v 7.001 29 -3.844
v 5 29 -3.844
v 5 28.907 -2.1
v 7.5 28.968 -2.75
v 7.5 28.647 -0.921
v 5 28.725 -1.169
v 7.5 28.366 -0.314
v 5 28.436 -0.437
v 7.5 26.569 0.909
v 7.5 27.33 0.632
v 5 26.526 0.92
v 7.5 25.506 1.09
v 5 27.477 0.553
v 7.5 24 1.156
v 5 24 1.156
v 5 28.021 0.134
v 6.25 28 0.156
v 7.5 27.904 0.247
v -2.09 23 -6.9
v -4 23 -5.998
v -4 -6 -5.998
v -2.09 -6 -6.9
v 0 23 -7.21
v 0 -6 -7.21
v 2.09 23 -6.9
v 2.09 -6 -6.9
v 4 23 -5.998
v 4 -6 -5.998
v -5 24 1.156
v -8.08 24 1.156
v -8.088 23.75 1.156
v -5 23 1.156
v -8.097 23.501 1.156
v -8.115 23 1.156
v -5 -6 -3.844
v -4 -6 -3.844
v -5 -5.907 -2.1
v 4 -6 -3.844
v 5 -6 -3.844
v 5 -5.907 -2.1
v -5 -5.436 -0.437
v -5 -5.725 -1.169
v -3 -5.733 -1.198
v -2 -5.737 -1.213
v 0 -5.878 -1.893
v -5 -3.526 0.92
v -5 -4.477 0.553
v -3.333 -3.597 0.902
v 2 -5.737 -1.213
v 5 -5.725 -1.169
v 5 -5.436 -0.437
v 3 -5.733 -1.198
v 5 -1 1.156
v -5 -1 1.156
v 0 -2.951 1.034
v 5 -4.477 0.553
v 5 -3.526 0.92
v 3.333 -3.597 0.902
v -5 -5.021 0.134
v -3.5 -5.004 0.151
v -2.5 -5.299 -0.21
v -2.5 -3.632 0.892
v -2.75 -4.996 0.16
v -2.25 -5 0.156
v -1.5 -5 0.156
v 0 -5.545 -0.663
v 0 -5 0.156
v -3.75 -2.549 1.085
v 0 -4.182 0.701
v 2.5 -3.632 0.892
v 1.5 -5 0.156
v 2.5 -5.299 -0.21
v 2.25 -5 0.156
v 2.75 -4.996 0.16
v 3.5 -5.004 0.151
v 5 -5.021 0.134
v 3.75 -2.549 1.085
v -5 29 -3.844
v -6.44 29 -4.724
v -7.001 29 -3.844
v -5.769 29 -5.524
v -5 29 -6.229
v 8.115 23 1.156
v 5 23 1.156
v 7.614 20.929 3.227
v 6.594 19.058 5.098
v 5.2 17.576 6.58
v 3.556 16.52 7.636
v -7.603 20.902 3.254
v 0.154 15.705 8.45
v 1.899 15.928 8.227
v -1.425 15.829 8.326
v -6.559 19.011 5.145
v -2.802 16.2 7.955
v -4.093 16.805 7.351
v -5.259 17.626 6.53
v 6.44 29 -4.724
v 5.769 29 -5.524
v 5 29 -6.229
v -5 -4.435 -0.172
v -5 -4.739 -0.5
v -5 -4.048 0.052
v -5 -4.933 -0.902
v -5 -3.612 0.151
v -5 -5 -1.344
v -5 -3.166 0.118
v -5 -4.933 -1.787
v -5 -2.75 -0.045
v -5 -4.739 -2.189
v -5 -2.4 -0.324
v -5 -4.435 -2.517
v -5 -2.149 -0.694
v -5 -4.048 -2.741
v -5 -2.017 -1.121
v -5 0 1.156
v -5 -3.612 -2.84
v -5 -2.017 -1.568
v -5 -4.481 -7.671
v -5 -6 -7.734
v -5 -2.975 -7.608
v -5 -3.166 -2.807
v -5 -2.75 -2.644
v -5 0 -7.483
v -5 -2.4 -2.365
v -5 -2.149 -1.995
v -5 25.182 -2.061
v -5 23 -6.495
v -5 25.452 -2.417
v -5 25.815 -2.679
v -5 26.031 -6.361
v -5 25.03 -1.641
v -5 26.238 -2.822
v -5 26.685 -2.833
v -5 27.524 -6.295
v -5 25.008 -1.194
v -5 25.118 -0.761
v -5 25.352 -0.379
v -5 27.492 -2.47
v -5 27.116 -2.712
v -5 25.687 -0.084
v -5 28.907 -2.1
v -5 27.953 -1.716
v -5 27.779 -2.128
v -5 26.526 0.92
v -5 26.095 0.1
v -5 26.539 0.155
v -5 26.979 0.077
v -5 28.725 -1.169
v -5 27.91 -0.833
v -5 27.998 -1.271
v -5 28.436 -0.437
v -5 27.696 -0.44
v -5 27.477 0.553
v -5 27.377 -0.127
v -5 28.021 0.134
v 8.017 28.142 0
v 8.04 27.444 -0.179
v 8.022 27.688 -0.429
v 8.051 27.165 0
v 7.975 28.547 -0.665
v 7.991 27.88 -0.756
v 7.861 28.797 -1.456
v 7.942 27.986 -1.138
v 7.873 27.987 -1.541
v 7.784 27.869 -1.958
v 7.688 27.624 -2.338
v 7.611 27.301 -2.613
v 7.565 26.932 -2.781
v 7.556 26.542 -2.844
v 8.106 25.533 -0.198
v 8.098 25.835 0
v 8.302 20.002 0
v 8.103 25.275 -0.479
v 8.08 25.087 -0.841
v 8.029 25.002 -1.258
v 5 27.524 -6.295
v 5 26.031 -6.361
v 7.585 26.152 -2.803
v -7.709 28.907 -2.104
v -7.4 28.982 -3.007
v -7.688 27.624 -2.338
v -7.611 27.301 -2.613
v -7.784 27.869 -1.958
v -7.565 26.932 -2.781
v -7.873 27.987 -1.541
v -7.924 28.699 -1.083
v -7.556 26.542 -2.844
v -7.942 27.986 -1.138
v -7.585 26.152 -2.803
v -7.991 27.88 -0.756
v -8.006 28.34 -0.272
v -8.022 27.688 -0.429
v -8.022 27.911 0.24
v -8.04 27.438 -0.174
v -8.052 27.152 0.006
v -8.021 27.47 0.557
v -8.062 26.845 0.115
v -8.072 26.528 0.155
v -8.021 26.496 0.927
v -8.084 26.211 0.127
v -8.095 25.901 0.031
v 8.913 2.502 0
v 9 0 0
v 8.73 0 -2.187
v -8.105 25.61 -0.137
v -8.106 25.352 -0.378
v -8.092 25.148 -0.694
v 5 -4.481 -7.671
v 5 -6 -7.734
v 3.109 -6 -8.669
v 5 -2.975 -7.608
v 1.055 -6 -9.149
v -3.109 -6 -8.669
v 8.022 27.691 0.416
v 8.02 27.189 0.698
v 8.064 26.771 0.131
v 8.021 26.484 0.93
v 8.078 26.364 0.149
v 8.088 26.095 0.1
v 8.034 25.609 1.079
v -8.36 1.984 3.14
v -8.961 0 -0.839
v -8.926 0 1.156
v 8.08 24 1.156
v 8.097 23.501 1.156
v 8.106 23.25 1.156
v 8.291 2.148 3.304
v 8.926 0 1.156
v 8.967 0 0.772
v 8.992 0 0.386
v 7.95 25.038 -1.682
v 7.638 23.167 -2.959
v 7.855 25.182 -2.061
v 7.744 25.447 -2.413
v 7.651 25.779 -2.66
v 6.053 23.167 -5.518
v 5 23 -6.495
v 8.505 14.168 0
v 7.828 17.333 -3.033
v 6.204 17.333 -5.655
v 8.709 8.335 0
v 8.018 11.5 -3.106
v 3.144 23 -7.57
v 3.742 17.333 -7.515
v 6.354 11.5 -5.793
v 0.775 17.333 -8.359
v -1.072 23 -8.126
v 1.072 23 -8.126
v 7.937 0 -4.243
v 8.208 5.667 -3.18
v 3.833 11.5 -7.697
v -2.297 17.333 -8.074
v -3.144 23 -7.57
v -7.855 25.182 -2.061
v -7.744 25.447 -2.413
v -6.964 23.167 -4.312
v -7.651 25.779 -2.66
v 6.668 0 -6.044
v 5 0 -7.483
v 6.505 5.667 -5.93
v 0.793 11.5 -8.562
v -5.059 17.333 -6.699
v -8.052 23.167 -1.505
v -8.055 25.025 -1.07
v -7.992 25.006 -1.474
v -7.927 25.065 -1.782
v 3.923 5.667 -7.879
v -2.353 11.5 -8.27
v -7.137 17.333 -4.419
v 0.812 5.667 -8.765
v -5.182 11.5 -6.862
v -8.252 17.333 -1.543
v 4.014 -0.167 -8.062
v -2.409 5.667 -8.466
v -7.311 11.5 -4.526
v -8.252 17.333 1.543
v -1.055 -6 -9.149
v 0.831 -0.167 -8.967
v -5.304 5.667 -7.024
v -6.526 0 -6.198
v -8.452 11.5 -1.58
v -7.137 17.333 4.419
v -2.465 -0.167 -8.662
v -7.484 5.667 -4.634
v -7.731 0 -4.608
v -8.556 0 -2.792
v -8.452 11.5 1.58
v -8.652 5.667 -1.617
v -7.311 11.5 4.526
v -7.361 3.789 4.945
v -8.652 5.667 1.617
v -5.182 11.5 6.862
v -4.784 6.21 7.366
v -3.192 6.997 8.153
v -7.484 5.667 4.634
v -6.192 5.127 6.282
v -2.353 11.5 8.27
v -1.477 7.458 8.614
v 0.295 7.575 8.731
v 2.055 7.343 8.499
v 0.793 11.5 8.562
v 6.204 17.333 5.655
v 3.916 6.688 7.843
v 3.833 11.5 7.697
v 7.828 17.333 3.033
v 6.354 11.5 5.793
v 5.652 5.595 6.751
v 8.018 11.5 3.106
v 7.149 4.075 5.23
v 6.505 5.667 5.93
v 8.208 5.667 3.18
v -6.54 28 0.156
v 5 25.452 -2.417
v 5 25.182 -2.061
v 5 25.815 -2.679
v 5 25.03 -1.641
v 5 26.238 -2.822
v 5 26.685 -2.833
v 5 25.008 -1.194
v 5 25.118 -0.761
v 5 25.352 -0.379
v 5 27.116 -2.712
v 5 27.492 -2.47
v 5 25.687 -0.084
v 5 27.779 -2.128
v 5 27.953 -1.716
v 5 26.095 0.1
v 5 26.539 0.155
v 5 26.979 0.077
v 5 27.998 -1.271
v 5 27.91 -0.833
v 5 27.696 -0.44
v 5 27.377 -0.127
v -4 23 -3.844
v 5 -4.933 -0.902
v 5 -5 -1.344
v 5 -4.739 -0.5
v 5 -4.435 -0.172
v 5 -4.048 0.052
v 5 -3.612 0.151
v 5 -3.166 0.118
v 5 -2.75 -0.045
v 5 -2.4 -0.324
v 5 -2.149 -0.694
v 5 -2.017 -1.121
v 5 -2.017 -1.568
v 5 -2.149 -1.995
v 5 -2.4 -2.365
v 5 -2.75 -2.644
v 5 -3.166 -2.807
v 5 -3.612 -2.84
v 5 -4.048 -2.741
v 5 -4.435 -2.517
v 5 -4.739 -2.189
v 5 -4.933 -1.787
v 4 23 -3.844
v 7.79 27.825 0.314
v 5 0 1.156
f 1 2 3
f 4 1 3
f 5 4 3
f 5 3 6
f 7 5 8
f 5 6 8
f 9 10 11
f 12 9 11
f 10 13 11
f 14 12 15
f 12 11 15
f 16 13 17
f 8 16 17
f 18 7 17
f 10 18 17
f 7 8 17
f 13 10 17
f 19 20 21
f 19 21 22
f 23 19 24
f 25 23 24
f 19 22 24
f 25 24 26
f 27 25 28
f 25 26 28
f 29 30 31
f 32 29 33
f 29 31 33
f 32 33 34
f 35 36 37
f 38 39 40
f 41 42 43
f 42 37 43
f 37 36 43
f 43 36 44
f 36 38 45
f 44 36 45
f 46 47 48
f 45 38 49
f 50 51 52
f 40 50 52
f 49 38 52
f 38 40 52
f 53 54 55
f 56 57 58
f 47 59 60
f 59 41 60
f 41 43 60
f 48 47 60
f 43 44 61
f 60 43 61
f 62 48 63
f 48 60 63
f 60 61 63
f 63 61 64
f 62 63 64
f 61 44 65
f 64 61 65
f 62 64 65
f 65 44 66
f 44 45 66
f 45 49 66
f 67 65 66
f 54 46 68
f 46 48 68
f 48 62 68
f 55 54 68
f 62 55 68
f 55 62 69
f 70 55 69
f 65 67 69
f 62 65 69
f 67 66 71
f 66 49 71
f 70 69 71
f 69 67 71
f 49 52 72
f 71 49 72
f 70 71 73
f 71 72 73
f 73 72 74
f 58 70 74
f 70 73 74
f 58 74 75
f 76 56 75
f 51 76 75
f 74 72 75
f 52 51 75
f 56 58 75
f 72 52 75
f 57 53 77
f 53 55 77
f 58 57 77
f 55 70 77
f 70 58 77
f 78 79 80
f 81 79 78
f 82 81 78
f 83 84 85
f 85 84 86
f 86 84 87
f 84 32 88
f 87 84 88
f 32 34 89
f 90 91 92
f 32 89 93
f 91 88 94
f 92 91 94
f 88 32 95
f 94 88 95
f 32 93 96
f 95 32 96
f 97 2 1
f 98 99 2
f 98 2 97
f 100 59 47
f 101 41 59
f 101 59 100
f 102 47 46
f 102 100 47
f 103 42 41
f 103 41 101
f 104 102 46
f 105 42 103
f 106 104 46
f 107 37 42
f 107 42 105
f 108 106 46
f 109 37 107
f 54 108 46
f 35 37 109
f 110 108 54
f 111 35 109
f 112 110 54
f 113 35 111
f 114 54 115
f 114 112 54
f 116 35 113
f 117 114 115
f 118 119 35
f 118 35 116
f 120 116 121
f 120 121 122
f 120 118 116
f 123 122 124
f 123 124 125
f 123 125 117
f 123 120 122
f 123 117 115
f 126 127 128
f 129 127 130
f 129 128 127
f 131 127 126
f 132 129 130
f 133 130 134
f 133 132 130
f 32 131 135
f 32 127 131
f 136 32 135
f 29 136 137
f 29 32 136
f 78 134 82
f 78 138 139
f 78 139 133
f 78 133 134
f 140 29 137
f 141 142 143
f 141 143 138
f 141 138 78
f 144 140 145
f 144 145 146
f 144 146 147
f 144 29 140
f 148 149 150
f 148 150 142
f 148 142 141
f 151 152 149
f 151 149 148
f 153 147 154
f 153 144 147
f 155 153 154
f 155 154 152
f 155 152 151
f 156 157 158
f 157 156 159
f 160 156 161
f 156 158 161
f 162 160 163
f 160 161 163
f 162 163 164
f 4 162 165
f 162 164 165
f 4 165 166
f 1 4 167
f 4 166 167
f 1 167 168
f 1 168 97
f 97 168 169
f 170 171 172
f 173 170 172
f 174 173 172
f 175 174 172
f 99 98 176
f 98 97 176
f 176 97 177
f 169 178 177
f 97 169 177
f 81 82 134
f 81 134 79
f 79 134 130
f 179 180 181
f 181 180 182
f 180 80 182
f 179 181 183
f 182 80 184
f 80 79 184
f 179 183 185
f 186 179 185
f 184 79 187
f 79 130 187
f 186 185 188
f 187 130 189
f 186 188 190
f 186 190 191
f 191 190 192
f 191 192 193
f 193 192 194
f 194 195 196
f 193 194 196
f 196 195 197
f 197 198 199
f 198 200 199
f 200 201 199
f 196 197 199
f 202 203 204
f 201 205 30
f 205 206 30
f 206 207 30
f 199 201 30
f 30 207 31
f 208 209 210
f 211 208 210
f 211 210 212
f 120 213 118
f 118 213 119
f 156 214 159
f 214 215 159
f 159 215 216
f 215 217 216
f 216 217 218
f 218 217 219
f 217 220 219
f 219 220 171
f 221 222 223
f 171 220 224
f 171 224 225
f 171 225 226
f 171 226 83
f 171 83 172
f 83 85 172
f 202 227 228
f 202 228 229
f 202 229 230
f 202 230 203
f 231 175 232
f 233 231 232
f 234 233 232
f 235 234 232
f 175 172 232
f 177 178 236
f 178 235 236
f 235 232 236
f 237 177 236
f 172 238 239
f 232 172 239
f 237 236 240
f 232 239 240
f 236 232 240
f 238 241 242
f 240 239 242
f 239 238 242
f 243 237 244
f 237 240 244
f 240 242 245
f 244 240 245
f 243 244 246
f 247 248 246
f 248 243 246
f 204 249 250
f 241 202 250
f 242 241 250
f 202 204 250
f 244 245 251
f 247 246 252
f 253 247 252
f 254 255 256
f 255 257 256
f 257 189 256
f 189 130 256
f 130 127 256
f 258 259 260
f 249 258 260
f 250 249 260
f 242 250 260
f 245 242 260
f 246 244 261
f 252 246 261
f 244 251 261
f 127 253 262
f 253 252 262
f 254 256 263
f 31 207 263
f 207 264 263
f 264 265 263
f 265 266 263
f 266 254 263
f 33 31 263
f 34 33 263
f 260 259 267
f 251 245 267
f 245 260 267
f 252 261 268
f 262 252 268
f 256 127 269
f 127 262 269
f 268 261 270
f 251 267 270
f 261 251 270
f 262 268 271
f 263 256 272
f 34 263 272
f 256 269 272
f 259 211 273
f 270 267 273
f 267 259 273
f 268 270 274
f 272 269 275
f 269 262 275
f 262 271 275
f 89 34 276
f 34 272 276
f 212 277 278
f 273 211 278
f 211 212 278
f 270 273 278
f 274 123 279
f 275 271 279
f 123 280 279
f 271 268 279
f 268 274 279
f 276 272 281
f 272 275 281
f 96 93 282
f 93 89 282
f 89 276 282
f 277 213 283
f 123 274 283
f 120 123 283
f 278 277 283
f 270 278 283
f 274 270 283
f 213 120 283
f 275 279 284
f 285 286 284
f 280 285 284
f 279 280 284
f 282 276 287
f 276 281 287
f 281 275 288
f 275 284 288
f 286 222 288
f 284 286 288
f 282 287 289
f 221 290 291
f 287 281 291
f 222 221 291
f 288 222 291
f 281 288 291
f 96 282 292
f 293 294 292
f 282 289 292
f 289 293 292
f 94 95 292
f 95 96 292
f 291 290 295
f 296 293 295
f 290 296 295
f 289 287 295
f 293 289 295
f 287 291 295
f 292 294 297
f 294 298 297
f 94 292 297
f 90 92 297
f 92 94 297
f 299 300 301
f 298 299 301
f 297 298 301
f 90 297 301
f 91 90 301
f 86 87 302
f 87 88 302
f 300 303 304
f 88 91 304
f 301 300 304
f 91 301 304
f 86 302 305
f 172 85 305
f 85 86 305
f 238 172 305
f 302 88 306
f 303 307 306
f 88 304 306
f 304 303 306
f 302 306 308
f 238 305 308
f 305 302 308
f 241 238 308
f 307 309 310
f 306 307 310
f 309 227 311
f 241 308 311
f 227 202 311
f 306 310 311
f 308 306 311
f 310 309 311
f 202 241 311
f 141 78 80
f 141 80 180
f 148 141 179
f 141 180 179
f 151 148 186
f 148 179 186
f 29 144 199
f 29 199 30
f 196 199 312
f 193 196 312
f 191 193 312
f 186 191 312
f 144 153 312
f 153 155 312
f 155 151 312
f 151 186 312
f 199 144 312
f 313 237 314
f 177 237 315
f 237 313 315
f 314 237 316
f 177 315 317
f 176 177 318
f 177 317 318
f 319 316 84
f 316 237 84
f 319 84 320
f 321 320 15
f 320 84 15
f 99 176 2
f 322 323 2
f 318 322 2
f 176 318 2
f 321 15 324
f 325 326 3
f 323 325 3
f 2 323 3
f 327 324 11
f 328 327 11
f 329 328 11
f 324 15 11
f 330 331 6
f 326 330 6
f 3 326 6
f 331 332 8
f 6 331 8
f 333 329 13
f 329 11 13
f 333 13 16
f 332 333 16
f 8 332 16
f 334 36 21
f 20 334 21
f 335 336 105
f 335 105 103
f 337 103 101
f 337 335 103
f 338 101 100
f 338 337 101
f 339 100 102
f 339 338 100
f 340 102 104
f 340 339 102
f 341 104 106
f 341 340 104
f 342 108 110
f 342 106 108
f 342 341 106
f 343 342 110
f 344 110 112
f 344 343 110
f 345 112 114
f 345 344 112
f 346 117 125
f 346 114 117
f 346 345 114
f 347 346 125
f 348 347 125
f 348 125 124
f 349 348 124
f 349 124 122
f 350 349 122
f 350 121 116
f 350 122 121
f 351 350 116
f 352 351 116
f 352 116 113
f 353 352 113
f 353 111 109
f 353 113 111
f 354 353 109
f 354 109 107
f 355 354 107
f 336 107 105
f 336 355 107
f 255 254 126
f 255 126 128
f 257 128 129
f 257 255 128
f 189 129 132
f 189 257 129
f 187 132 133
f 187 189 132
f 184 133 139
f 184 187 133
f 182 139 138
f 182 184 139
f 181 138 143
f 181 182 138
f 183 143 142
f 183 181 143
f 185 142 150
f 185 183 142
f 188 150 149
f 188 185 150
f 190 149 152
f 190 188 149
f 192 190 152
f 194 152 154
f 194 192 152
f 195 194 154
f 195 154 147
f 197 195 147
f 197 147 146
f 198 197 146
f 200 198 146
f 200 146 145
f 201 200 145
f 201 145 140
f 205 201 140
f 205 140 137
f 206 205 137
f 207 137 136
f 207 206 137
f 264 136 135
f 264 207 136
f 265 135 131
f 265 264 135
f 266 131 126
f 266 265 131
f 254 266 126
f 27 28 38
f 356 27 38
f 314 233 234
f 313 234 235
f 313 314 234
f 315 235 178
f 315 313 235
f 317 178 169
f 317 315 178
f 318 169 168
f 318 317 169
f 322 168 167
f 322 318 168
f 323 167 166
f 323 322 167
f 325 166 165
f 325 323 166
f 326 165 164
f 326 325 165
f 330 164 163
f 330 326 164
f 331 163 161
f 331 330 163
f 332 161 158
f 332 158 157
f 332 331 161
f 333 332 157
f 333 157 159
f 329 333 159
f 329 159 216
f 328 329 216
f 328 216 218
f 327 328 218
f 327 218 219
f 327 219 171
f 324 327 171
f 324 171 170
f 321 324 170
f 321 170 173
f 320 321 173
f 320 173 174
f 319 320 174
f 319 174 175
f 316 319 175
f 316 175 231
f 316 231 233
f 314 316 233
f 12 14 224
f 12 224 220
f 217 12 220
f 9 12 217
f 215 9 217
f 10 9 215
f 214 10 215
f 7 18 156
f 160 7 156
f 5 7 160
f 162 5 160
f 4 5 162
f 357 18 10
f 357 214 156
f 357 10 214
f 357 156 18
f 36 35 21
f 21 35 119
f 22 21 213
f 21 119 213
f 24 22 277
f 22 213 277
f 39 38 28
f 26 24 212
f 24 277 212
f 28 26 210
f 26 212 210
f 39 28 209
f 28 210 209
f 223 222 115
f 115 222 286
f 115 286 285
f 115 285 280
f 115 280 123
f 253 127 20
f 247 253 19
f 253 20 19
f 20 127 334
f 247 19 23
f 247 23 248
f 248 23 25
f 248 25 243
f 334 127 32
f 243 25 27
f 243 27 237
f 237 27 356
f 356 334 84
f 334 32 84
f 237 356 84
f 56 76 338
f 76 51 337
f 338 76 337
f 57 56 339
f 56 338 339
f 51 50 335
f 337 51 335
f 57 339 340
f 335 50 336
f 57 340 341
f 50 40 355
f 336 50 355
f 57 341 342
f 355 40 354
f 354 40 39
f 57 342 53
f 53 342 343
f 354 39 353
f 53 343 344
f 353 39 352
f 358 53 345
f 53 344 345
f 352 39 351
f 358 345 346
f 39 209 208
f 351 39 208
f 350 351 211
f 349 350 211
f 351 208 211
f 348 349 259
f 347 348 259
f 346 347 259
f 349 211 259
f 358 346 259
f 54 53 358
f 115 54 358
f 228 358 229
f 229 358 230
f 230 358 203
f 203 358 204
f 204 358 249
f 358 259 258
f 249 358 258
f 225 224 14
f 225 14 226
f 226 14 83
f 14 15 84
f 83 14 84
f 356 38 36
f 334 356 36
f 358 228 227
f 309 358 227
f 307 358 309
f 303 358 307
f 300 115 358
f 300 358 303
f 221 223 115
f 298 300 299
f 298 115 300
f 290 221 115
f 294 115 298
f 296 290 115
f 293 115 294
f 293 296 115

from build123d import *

# Parameters (mm, degrees)
SKETCH1_R                     = 9
BOSS_EXTRUDE1_DEPTH           = 29
BOSS_EXTRUDE1_TAPER           = 2
BOSS_EXTRUDE1_OTHER_WAY_DEPTH = 6
BOSS_EXTRUDE1_OTHER_WAY_TAPER = -2
CUT_EXTRUDE1_DEPTH            = 32.790418169
CUT_EXTRUDE1_DEPTH_BACK       = 32.790418169
CUT_EXTRUDE2_START            = -10.365035118
CUT_EXTRUDE2_OUTLINE_W        = 9.770566763
CUT_EXTRUDE2_OUTLINE_H        = 6
CUT_EXTRUDE2_DEPTH            = 10.365035118
CUT_EXTRUDE3_DEPTH            = 34.493511964
CUT_EXTRUDE3_DEPTH_BACK       = 34.493511964
SKETCH5_R                     = 1.5
FILLET1_SIZE                  = 5
CUT_EXTRUDE4_DEPTH            = 32.730353664
CUT_EXTRUDE4_DEPTH_BACK       = 32.730353664
SKETCH8_W                     = 10
SKETCH8_H                     = 6
CUT_EXTRUDE5_DEPTH            = 33.084793141
CUT_EXTRUDE6_DEPTH            = 34.493511964
CUT_EXTRUDE6_DEPTH_BACK       = 34.493511964
SKETCH9_R                     = 1.5
FILLET2_SIZE                  = 5
CUT_EXTRUDE7_DEPTH            = 38.293636915


with BuildPart() as part:
    # Sketch1 → Boss-Extrude1 (new body)
    with BuildSketch(Plane(origin=(0, 0, 0), x_dir=(1, 0, 0), z_dir=(0, 1, 0))):
        Circle(SKETCH1_R)
    extrude(amount=BOSS_EXTRUDE1_DEPTH, taper=BOSS_EXTRUDE1_TAPER)

    # Sketch1 → Boss-Extrude1 other way (add)
    with BuildSketch(Plane(origin=(0, 0, 0), x_dir=(1, 0, 0), z_dir=(0, 1, 0))):
        Circle(SKETCH1_R)
    extrude(amount=-BOSS_EXTRUDE1_OTHER_WAY_DEPTH, taper=BOSS_EXTRUDE1_OTHER_WAY_TAPER)

    # Sketch3 → Cut-Extrude1 (cut, two sides: drawn at the far end of the back side and taken through both)
    with BuildSketch(Plane(origin=(0, 0, 0), x_dir=(0, 0, -1), z_dir=(1, 0, 0)).offset(-CUT_EXTRUDE1_DEPTH_BACK)):
        Polygon((-1.155510401, -6), (-1.155510401, 0), (-11.155510401, 10), (-11.155510401, -6), align=None)
    extrude(amount=CUT_EXTRUDE1_DEPTH + CUT_EXTRUDE1_DEPTH_BACK, mode=Mode.SUBTRACT)

    # Cut-Extrude2: read off the stored shape, not the designer's step
    # Cut-Extrude2 outline → Cut-Extrude2 (cut)
    with BuildSketch(Plane.XY.offset(1.155510401).offset(CUT_EXTRUDE2_START)):
        with Locations((-9.885283382, -3)):
            Rectangle(CUT_EXTRUDE2_OUTLINE_W, CUT_EXTRUDE2_OUTLINE_H)
        with Locations((9.885283382, -3)):
            Rectangle(CUT_EXTRUDE2_OUTLINE_W, CUT_EXTRUDE2_OUTLINE_H)
    extrude(amount=CUT_EXTRUDE2_DEPTH, mode=Mode.SUBTRACT)

    # Sketch5 → Cut-Extrude3 (cut, two sides: drawn at the far end of the back side and taken through both)
    with BuildSketch(Plane.ZY.offset(5).offset(-CUT_EXTRUDE3_DEPTH_BACK)):
        with Locations(Location((-1.344489599, -3.5, 0), (0, 0, 270))):
            Circle(SKETCH5_R)
    extrude(amount=CUT_EXTRUDE3_DEPTH + CUT_EXTRUDE3_DEPTH_BACK, mode=Mode.SUBTRACT)

    # Fillet1
    # a fillet whose section is not a circle: 5 mm, written as the material it takes off along each edge
    with BuildSketch(Plane(origin=(17.5, -6, 1.155510401), x_dir=(0, 0, -1), z_dir=(-1, 0, 0))) as fillet1_piece_1:
        with BuildLine():
            Bezier((FILLET1_SIZE, 0), (0, 0), (0, -FILLET1_SIZE), weights=[1, 1.5, 1])
            Line((0, -FILLET1_SIZE), (0, 0))
            Line((0, 0), (FILLET1_SIZE, 0))
        make_face()
    extrude(amount=35, mode=Mode.SUBTRACT)

    # Sketch7 → Cut-Extrude4 (cut, two sides: drawn at the far end of the back side and taken through both)
    with BuildSketch(Plane(origin=(0, 0, 0), x_dir=(0, 0, -1), z_dir=(1, 0, 0)).offset(-CUT_EXTRUDE4_DEPTH_BACK)):
        Polygon((-1.155510401, 29), (-1.155510401, 23), (-12.24506556, 11.91044484), (-12.24506556, 29), align=None)
    extrude(amount=CUT_EXTRUDE4_DEPTH + CUT_EXTRUDE4_DEPTH_BACK, mode=Mode.SUBTRACT)

    # Sketch8 → Cut-Extrude5 (cut, through all)
    with BuildSketch(Plane.XY.offset(1.155510401)):
        with Locations((0, 26)):
            Rectangle(SKETCH8_W, SKETCH8_H)
    extrude(amount=-CUT_EXTRUDE5_DEPTH, mode=Mode.SUBTRACT)

    # Sketch9 → Cut-Extrude6 (cut, two sides: drawn at the far end of the back side and taken through both)
    with BuildSketch(Plane(origin=(-5, 0, 0), x_dir=(0, 0, -1), z_dir=(1, 0, 0)).offset(-CUT_EXTRUDE6_DEPTH_BACK)):
        with Locations(Location((1.344489599, 26.5, 0), (0, 0, 298.528207369))):
            Circle(SKETCH9_R)
    extrude(amount=CUT_EXTRUDE6_DEPTH + CUT_EXTRUDE6_DEPTH_BACK, mode=Mode.SUBTRACT)

    # Fillet2
    # a fillet whose section is not a circle: 5 mm, written as the material it takes off along each edge
    with BuildSketch(Plane(origin=(-20.403272741, 29, 1.155510401), x_dir=(0, 0, -1), z_dir=(1, 0, 0))) as fillet2_piece_1:
        with BuildLine():
            Bezier((FILLET2_SIZE, 0), (0, 0), (0, -FILLET2_SIZE), weights=[1, 1.5, 1])
            Line((0, -FILLET2_SIZE), (0, 0))
            Line((0, 0), (FILLET2_SIZE, 0))
        make_face()
    extrude(amount=27.903272741, mode=Mode.SUBTRACT)
    with BuildSketch(Plane(origin=(-7.5, 29, 1.155510401), x_dir=(0, -1, 0), z_dir=(1, 0, 0))) as fillet2_piece_2:
        with BuildLine():
            Bezier((FILLET2_SIZE, 0), (0, 0), (0, FILLET2_SIZE), weights=[1, 1.5, 1])
            Line((0, FILLET2_SIZE), (0, 0))
            Line((0, 0), (FILLET2_SIZE, 0))
        make_face()
    extrude(amount=27.903272741, mode=Mode.SUBTRACT)

    # Sketch10 → Cut-Extrude7 (cut, through all)
    with BuildSketch(Plane.XZ.offset(6)):
        with BuildLine():
            Line((-4, -3.844489599), (-4, -5.998103467))
            ThreePointArc((-4, -5.998103467), (0, -7.209524617), (4, -5.998103467))
            Line((4, -5.998103467), (4, -3.844489599))
            Line((4, -3.844489599), (-4, -3.844489599))
        make_face()
    extrude(amount=-CUT_EXTRUDE7_DEPTH, mode=Mode.SUBTRACT)


solid = part.part
